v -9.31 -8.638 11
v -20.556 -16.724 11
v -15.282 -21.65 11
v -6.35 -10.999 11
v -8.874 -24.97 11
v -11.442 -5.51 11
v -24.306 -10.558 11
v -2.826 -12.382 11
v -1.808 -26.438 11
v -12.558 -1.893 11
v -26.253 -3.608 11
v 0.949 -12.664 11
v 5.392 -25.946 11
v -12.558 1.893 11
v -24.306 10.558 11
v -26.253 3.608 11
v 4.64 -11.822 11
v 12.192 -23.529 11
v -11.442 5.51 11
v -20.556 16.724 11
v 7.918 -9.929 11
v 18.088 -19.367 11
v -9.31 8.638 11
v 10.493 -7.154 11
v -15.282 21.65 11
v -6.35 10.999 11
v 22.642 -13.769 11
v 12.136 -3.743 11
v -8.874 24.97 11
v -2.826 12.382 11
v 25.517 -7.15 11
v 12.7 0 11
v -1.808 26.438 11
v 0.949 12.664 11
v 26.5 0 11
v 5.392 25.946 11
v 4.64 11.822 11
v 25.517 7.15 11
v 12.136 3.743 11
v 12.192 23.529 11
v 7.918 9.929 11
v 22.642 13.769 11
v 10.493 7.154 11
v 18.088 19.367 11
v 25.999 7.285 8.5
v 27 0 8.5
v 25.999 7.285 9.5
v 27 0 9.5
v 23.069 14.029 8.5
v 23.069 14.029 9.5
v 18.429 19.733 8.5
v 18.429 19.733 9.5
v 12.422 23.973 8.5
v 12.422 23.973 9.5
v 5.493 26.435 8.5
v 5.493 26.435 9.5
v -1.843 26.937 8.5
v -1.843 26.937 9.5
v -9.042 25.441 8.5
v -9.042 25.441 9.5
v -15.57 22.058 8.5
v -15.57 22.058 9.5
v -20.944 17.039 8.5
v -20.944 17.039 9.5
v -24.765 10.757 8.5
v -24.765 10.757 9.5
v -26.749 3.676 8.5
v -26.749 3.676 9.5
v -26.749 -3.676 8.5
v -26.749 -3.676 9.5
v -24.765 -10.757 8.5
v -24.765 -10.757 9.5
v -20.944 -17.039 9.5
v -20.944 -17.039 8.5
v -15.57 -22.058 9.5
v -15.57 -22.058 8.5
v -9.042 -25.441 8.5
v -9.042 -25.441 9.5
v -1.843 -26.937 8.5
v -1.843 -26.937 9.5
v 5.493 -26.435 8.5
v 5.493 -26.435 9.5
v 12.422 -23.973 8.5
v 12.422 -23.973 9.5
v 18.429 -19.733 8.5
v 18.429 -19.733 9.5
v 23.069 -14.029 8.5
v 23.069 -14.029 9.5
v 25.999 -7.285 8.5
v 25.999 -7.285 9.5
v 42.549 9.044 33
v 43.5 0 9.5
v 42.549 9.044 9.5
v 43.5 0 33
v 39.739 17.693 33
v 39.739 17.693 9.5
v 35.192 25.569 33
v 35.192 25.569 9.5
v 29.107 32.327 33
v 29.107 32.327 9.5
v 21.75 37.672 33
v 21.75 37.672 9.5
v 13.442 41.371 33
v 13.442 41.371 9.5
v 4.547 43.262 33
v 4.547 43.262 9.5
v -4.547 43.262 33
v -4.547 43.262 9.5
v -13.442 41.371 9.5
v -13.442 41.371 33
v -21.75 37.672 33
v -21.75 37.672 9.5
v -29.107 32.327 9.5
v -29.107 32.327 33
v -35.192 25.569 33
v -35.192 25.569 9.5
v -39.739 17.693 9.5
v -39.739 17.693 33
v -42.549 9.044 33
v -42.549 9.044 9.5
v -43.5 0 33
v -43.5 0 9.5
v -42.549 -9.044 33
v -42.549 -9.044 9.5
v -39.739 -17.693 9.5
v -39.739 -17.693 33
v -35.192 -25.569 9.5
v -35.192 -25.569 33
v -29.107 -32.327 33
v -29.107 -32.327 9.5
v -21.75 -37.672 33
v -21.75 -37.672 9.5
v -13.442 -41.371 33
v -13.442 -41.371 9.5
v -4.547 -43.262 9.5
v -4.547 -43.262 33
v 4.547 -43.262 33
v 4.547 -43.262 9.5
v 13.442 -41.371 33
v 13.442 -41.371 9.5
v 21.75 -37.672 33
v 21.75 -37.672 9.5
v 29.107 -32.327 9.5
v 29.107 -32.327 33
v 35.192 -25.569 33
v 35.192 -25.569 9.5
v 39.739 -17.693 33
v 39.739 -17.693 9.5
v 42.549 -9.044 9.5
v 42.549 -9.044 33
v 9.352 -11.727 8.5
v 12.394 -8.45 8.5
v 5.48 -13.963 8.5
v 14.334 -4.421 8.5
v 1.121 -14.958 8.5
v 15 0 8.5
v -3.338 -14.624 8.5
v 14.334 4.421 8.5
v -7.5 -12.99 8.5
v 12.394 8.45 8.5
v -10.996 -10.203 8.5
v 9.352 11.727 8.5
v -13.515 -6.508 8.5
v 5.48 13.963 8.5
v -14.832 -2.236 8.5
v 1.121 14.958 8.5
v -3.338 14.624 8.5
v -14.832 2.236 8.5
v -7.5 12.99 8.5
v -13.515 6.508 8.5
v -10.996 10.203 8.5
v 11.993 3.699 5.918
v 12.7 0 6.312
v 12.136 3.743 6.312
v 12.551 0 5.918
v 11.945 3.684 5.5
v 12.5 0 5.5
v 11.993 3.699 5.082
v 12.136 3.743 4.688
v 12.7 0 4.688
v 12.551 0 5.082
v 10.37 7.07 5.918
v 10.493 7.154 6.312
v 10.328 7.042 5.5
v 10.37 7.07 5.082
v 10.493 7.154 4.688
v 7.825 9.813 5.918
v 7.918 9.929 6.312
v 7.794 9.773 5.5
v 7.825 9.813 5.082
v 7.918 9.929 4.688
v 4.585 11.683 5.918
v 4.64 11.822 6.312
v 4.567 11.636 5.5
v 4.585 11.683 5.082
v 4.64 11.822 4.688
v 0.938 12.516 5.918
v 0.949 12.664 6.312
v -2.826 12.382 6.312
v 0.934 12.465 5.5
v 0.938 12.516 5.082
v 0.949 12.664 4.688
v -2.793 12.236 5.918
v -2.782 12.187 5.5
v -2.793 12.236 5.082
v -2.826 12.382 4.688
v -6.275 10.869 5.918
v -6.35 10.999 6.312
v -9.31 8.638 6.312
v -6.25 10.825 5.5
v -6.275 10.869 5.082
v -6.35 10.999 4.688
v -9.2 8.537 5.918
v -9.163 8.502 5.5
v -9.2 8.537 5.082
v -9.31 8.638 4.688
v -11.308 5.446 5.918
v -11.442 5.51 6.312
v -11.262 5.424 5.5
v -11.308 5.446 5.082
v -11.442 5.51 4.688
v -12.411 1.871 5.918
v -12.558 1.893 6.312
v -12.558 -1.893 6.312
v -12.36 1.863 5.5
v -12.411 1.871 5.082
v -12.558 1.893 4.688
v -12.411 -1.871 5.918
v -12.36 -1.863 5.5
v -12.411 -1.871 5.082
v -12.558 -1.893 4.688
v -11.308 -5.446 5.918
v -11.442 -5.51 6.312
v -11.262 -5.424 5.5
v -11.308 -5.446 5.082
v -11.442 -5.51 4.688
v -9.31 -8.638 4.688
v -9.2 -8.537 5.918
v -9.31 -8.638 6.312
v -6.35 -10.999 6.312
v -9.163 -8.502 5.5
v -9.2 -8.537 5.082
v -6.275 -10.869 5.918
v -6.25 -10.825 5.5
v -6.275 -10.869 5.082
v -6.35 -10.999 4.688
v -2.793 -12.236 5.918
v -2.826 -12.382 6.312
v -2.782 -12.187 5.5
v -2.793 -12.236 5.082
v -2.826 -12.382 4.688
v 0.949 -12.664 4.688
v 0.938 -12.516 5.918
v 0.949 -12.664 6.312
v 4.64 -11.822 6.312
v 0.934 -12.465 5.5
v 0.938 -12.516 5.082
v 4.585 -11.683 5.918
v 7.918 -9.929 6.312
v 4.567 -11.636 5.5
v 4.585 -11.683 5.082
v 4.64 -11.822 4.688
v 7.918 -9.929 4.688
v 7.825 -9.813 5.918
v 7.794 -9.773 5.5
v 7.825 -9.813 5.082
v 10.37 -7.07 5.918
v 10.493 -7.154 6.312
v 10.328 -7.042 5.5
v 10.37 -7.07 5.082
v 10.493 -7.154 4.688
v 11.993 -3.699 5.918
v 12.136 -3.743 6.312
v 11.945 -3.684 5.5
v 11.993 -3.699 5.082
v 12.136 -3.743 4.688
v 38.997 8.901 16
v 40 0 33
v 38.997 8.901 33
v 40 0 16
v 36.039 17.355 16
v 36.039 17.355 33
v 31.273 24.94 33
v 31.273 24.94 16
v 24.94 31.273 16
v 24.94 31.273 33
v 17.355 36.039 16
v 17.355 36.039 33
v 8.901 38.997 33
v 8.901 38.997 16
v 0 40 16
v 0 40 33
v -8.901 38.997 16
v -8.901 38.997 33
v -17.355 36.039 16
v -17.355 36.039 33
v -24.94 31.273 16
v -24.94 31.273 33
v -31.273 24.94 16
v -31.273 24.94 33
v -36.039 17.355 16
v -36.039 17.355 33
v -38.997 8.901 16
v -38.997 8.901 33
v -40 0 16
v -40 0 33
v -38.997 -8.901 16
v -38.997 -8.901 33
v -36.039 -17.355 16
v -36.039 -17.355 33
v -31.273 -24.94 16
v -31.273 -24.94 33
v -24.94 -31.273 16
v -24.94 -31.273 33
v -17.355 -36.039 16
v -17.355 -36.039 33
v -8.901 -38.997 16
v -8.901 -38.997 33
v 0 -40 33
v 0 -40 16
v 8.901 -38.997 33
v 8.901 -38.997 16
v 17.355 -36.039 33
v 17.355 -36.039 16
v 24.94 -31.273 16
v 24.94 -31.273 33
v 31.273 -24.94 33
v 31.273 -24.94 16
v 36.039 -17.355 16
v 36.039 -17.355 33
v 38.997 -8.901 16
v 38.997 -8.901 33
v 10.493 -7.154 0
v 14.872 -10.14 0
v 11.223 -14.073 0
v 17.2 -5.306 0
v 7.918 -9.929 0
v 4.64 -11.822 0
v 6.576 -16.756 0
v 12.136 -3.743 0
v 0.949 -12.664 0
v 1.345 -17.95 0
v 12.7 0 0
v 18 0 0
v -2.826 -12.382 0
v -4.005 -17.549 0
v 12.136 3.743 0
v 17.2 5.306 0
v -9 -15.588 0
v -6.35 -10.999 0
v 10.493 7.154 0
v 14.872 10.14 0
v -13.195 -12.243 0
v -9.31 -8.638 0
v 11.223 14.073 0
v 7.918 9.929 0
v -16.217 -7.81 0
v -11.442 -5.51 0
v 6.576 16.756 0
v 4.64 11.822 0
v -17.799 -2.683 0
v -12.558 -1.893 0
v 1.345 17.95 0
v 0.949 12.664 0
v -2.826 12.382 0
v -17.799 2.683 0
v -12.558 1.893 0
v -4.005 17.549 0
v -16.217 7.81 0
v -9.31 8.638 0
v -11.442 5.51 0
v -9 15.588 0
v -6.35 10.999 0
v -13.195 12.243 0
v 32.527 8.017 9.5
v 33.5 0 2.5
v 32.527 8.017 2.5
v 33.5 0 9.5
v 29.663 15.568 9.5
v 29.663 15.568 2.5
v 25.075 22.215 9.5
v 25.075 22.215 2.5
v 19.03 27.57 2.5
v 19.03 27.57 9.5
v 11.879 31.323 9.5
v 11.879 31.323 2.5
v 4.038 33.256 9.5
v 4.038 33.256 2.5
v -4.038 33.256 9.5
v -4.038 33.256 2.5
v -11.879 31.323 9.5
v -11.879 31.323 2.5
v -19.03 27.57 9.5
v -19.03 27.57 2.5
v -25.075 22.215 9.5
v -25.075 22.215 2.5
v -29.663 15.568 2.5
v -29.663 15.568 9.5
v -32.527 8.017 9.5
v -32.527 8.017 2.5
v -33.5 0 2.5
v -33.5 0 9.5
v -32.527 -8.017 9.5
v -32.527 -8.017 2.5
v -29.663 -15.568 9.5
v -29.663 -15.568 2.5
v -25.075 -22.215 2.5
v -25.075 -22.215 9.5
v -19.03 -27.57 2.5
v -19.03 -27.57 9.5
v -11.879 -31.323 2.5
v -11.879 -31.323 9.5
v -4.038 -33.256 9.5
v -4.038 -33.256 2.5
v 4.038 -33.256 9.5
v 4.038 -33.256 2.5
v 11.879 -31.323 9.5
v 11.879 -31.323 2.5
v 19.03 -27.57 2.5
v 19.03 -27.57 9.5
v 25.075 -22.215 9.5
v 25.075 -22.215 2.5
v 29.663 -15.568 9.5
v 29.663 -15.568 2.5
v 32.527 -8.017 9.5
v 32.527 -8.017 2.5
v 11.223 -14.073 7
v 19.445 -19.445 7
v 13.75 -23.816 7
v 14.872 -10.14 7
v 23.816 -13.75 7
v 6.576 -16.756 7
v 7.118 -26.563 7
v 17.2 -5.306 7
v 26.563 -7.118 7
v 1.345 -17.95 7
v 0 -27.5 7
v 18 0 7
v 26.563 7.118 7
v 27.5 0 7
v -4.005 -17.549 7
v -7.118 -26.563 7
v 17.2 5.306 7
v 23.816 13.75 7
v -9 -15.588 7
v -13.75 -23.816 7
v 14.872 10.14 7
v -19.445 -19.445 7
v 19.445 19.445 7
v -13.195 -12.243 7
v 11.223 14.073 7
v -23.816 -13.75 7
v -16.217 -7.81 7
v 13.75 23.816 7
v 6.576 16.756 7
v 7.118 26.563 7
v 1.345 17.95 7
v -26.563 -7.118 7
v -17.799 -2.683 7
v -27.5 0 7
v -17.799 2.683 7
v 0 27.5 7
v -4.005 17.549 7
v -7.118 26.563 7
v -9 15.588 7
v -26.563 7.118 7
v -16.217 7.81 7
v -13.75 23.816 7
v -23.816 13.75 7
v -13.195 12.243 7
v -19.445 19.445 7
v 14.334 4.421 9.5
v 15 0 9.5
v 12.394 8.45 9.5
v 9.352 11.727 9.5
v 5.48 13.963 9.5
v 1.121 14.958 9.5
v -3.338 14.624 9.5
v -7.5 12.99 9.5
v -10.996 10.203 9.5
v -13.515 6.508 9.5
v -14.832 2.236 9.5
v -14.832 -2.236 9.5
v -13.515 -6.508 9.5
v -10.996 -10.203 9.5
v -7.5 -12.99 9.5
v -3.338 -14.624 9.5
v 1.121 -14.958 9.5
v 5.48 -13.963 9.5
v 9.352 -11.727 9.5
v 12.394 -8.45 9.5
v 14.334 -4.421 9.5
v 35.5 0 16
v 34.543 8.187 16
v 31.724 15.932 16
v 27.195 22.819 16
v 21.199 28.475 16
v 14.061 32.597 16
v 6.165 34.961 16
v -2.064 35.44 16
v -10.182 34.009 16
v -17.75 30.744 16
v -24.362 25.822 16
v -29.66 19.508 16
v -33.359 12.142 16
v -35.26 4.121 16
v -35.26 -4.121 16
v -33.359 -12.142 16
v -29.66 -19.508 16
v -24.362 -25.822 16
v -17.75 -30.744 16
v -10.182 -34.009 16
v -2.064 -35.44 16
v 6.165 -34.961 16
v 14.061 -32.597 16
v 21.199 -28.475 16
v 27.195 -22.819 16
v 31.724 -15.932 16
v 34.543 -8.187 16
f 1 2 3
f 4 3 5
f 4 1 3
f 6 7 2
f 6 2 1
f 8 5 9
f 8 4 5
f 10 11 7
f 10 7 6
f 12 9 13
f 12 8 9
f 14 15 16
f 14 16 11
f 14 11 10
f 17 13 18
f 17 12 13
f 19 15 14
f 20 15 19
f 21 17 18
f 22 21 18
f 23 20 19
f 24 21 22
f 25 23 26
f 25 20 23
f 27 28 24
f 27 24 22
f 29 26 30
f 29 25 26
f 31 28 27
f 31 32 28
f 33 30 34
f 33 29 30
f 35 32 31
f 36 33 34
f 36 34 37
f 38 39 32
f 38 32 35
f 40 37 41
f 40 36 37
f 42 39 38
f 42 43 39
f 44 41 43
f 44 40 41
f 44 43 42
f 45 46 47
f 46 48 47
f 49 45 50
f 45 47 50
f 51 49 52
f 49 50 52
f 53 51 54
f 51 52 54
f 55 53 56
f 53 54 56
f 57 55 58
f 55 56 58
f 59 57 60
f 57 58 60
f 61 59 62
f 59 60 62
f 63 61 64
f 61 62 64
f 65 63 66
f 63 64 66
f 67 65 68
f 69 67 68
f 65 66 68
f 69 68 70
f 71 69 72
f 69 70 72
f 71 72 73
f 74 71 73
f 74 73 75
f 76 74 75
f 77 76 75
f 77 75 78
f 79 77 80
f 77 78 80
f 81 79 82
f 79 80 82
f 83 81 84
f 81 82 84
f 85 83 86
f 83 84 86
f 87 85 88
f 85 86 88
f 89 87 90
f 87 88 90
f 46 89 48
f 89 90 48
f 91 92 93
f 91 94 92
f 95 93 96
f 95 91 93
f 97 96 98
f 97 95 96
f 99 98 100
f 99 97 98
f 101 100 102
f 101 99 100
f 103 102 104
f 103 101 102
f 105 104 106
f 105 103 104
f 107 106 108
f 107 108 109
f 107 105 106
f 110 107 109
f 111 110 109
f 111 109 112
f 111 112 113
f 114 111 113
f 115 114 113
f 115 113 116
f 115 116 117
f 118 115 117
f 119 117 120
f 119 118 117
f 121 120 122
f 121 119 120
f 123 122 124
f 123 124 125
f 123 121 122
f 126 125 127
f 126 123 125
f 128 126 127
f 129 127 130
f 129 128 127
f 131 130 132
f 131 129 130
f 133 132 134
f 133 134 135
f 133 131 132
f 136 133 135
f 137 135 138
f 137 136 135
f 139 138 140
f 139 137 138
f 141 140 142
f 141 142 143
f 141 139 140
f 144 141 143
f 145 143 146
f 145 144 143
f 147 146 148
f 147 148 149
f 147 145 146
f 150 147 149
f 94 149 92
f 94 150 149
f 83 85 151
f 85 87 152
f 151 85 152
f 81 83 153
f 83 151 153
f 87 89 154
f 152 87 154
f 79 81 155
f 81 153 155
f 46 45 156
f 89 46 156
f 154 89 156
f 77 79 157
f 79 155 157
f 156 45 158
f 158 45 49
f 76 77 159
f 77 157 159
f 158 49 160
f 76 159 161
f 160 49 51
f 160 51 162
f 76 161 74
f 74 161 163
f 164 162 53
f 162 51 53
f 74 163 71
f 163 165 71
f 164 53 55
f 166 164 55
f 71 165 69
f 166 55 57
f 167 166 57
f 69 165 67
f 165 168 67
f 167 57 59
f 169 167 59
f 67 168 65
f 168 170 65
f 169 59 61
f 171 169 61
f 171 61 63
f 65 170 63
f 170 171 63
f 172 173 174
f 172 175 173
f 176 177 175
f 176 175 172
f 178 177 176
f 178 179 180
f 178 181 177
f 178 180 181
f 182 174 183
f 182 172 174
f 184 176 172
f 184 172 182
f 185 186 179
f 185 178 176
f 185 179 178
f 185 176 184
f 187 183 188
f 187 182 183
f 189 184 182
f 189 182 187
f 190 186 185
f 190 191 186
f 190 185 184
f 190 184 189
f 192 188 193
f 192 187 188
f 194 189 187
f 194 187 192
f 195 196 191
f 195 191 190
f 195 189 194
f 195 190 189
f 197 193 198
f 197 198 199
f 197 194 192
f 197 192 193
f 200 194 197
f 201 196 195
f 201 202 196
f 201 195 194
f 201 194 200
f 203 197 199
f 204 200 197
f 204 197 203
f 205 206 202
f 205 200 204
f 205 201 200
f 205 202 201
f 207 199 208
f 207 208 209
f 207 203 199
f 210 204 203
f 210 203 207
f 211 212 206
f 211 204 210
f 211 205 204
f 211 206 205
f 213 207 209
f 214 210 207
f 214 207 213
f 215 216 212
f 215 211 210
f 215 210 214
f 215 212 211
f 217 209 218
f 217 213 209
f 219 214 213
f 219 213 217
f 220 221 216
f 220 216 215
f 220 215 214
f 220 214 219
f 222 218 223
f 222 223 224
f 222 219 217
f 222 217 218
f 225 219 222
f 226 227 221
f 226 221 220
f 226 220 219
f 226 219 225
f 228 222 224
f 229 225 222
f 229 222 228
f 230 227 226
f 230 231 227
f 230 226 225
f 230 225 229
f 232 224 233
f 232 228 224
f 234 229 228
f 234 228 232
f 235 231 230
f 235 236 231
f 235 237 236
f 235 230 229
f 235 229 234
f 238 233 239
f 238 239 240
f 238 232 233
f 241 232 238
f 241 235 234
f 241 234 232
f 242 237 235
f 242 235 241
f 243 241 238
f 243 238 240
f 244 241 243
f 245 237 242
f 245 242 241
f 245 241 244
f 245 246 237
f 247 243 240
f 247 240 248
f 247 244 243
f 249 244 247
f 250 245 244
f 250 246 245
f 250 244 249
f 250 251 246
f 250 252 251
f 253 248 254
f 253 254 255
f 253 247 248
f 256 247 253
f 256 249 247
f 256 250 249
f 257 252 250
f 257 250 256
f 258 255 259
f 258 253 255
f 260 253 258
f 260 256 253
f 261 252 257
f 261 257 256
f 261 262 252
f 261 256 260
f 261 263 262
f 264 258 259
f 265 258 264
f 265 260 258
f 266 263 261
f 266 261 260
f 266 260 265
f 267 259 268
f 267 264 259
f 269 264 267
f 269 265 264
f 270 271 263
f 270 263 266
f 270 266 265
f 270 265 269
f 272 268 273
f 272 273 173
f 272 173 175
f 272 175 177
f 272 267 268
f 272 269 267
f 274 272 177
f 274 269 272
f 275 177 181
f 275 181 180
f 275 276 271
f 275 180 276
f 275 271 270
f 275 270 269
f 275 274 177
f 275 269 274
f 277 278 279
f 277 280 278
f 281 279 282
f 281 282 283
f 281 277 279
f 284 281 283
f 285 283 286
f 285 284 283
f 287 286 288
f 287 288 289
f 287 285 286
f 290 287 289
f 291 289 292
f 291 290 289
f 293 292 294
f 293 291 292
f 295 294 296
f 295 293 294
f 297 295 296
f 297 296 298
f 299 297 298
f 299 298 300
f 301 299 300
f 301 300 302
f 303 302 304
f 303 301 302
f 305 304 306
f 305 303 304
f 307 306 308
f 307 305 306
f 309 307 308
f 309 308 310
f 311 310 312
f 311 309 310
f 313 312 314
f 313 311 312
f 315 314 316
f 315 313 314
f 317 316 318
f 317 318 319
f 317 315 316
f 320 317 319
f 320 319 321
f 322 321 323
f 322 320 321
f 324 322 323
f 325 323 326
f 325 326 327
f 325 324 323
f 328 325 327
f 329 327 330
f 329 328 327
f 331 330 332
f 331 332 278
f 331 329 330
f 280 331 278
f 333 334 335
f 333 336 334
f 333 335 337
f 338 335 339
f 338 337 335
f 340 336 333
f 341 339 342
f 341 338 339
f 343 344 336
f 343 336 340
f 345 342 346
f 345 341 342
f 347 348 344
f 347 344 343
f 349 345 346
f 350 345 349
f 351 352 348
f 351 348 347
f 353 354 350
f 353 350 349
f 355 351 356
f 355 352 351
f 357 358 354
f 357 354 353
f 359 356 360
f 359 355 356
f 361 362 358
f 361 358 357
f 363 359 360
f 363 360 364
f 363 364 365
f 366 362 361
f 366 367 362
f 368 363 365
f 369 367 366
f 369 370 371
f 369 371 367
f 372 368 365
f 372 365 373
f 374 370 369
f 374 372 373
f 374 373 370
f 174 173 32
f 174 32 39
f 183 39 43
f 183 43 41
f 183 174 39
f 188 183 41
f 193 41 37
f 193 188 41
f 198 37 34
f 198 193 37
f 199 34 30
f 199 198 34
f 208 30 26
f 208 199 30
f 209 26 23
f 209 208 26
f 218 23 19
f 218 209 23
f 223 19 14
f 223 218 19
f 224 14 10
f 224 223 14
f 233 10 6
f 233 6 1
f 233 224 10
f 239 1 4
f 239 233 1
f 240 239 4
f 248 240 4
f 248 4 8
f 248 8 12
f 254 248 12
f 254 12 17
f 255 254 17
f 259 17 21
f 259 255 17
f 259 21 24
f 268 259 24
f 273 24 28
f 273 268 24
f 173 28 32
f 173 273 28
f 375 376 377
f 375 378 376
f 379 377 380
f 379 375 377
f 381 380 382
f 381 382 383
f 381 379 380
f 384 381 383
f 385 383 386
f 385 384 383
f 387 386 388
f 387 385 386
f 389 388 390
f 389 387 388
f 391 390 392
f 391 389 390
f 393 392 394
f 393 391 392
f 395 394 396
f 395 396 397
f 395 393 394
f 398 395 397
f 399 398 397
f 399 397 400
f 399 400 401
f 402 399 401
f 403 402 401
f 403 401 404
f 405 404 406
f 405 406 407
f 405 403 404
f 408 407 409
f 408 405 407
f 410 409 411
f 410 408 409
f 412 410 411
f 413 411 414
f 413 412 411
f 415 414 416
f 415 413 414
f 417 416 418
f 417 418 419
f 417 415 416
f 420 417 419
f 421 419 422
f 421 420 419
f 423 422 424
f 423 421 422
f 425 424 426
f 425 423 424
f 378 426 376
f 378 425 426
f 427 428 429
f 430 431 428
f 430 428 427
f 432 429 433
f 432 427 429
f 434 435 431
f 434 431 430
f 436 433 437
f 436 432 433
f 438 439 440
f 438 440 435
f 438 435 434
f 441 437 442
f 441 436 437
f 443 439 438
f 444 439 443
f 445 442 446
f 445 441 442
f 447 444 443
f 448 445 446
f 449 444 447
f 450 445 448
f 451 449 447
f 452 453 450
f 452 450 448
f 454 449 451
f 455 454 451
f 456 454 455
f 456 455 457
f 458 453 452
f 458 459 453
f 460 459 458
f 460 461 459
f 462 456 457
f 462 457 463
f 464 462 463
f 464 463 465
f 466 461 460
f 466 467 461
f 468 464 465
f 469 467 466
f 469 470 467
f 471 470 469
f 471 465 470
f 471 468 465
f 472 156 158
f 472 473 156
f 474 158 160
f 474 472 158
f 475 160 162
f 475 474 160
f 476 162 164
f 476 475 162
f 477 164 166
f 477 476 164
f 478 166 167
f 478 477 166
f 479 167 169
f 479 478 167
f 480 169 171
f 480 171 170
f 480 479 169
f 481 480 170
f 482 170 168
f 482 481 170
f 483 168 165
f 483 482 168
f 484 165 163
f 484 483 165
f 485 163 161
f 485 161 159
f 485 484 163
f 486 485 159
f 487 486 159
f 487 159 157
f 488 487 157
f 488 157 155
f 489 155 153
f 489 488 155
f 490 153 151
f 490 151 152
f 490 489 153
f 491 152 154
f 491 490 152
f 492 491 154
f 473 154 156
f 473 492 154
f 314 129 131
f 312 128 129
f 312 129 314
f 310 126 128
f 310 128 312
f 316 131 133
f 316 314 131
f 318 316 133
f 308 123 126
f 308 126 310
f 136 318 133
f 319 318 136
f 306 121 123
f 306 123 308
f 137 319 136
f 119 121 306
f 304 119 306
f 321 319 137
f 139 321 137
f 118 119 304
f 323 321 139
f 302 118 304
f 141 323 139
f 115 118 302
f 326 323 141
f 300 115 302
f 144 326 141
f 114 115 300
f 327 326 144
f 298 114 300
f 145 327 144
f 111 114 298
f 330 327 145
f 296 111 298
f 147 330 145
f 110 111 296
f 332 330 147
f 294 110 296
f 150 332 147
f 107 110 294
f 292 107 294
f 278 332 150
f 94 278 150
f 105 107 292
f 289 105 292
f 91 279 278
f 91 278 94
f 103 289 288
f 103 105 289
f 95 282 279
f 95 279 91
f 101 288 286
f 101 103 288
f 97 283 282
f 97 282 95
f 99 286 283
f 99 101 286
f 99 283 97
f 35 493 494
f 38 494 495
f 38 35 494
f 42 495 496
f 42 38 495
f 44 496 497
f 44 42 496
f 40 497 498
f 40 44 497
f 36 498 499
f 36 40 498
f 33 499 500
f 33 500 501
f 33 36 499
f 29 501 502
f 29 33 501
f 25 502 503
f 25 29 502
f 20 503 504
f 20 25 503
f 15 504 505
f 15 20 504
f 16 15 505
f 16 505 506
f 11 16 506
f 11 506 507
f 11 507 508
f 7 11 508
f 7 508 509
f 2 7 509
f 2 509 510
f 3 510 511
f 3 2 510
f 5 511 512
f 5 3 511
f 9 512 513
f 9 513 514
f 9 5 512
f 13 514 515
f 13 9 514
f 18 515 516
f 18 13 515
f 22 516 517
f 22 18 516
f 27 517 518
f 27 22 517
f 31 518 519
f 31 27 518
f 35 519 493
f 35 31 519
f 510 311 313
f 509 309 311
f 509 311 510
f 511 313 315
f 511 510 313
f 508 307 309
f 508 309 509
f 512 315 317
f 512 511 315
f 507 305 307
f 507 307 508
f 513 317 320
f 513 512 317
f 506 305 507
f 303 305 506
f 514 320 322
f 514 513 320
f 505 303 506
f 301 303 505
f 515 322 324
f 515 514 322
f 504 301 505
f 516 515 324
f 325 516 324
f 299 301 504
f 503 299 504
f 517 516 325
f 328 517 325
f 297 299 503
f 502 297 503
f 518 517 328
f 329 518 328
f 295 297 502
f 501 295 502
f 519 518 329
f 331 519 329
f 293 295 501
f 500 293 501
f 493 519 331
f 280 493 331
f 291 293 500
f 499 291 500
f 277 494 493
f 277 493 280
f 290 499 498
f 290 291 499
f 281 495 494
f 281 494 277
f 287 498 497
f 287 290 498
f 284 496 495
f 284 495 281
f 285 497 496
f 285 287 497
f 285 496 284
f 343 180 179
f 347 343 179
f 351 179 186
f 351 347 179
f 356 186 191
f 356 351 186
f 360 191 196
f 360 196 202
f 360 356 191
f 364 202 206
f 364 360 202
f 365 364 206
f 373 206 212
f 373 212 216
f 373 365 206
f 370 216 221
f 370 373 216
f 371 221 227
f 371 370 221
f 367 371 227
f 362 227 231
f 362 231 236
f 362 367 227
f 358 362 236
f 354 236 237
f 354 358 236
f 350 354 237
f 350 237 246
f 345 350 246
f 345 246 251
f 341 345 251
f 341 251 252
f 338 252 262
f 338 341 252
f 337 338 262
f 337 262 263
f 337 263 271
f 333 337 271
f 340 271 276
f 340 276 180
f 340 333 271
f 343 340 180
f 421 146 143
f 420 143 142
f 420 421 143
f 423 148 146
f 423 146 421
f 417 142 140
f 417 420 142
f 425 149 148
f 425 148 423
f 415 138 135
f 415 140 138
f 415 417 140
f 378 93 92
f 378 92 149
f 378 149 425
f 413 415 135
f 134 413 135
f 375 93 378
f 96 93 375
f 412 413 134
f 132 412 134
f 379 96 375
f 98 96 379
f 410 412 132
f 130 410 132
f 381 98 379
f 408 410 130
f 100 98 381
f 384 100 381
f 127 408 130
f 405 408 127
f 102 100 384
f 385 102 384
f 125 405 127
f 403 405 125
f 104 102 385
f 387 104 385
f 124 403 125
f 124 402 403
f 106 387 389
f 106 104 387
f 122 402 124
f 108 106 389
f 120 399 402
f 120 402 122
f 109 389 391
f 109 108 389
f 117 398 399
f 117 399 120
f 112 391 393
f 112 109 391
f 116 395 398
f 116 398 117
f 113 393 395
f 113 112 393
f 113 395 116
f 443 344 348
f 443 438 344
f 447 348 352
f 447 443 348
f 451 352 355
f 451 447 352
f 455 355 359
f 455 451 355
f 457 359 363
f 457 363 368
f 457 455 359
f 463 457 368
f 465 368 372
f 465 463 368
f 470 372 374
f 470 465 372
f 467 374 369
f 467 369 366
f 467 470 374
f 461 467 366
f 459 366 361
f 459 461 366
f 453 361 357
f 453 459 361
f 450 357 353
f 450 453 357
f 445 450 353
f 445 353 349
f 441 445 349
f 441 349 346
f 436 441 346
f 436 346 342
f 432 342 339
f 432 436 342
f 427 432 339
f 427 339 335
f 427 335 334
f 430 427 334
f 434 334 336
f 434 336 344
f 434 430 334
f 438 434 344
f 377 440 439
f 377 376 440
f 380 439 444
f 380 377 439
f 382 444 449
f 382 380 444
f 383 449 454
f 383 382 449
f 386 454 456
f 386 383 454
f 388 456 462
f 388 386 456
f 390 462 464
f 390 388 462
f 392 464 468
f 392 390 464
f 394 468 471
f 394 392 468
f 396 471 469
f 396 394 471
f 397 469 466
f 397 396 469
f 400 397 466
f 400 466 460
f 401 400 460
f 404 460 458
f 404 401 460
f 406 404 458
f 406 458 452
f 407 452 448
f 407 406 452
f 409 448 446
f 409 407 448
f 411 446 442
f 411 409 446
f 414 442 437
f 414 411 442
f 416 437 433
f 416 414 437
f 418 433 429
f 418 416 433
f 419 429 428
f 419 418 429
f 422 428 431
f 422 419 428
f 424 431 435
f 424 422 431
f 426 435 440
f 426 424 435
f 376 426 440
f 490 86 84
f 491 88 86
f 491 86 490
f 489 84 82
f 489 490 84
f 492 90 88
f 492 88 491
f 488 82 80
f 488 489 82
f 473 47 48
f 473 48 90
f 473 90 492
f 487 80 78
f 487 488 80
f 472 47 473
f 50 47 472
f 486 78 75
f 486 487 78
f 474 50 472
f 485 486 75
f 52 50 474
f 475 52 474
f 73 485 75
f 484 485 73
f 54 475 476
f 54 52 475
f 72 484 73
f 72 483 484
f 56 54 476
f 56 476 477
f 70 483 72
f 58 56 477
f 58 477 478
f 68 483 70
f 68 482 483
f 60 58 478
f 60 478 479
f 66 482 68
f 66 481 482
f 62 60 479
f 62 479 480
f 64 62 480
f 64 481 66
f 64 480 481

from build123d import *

# Parameters (mm, degrees)
SKETCH001_R = 1.75
SKETCH002_W = 12
SKETCH002_H = 1


with BuildPart() as part:
    # Sketch (on XZ_Plane of Origin) → Revolution (revolve)
    with BuildSketch(Plane.XZ):
        Polygon((12.7, 0), (18, 0), (18, 7), (27.5, 7), (33.5, 2.5), (33.5, 9.5), (43.5, 9.5), (43.5, 33), (40, 33), (40, 16), (35.5, 16), (26.5, 11), (12.7, 11), align=None)
    revolve(axis=Axis((0, 0, 0), (0, 0, 1)))

    # Sketch001 (on XZ_Plane of Origin) → Revolution001 (revolve)
    with BuildSketch(Plane.XZ):
        with Locations((14.25, 5.5)):
            Circle(SKETCH001_R)
    revolve(axis=Axis((0, 0, 0), (0, 0, 1)))

    # Sketch002 (on XZ_Plane of Origin) → Groove (revolve, cut)
    with BuildSketch(Plane.XZ):
        with Locations((21, 9)):
            Rectangle(SKETCH002_W, SKETCH002_H)
    revolve(axis=Axis((0, 0, 0), (0, 0, 1)), mode=Mode.SUBTRACT)


solid = part.part
